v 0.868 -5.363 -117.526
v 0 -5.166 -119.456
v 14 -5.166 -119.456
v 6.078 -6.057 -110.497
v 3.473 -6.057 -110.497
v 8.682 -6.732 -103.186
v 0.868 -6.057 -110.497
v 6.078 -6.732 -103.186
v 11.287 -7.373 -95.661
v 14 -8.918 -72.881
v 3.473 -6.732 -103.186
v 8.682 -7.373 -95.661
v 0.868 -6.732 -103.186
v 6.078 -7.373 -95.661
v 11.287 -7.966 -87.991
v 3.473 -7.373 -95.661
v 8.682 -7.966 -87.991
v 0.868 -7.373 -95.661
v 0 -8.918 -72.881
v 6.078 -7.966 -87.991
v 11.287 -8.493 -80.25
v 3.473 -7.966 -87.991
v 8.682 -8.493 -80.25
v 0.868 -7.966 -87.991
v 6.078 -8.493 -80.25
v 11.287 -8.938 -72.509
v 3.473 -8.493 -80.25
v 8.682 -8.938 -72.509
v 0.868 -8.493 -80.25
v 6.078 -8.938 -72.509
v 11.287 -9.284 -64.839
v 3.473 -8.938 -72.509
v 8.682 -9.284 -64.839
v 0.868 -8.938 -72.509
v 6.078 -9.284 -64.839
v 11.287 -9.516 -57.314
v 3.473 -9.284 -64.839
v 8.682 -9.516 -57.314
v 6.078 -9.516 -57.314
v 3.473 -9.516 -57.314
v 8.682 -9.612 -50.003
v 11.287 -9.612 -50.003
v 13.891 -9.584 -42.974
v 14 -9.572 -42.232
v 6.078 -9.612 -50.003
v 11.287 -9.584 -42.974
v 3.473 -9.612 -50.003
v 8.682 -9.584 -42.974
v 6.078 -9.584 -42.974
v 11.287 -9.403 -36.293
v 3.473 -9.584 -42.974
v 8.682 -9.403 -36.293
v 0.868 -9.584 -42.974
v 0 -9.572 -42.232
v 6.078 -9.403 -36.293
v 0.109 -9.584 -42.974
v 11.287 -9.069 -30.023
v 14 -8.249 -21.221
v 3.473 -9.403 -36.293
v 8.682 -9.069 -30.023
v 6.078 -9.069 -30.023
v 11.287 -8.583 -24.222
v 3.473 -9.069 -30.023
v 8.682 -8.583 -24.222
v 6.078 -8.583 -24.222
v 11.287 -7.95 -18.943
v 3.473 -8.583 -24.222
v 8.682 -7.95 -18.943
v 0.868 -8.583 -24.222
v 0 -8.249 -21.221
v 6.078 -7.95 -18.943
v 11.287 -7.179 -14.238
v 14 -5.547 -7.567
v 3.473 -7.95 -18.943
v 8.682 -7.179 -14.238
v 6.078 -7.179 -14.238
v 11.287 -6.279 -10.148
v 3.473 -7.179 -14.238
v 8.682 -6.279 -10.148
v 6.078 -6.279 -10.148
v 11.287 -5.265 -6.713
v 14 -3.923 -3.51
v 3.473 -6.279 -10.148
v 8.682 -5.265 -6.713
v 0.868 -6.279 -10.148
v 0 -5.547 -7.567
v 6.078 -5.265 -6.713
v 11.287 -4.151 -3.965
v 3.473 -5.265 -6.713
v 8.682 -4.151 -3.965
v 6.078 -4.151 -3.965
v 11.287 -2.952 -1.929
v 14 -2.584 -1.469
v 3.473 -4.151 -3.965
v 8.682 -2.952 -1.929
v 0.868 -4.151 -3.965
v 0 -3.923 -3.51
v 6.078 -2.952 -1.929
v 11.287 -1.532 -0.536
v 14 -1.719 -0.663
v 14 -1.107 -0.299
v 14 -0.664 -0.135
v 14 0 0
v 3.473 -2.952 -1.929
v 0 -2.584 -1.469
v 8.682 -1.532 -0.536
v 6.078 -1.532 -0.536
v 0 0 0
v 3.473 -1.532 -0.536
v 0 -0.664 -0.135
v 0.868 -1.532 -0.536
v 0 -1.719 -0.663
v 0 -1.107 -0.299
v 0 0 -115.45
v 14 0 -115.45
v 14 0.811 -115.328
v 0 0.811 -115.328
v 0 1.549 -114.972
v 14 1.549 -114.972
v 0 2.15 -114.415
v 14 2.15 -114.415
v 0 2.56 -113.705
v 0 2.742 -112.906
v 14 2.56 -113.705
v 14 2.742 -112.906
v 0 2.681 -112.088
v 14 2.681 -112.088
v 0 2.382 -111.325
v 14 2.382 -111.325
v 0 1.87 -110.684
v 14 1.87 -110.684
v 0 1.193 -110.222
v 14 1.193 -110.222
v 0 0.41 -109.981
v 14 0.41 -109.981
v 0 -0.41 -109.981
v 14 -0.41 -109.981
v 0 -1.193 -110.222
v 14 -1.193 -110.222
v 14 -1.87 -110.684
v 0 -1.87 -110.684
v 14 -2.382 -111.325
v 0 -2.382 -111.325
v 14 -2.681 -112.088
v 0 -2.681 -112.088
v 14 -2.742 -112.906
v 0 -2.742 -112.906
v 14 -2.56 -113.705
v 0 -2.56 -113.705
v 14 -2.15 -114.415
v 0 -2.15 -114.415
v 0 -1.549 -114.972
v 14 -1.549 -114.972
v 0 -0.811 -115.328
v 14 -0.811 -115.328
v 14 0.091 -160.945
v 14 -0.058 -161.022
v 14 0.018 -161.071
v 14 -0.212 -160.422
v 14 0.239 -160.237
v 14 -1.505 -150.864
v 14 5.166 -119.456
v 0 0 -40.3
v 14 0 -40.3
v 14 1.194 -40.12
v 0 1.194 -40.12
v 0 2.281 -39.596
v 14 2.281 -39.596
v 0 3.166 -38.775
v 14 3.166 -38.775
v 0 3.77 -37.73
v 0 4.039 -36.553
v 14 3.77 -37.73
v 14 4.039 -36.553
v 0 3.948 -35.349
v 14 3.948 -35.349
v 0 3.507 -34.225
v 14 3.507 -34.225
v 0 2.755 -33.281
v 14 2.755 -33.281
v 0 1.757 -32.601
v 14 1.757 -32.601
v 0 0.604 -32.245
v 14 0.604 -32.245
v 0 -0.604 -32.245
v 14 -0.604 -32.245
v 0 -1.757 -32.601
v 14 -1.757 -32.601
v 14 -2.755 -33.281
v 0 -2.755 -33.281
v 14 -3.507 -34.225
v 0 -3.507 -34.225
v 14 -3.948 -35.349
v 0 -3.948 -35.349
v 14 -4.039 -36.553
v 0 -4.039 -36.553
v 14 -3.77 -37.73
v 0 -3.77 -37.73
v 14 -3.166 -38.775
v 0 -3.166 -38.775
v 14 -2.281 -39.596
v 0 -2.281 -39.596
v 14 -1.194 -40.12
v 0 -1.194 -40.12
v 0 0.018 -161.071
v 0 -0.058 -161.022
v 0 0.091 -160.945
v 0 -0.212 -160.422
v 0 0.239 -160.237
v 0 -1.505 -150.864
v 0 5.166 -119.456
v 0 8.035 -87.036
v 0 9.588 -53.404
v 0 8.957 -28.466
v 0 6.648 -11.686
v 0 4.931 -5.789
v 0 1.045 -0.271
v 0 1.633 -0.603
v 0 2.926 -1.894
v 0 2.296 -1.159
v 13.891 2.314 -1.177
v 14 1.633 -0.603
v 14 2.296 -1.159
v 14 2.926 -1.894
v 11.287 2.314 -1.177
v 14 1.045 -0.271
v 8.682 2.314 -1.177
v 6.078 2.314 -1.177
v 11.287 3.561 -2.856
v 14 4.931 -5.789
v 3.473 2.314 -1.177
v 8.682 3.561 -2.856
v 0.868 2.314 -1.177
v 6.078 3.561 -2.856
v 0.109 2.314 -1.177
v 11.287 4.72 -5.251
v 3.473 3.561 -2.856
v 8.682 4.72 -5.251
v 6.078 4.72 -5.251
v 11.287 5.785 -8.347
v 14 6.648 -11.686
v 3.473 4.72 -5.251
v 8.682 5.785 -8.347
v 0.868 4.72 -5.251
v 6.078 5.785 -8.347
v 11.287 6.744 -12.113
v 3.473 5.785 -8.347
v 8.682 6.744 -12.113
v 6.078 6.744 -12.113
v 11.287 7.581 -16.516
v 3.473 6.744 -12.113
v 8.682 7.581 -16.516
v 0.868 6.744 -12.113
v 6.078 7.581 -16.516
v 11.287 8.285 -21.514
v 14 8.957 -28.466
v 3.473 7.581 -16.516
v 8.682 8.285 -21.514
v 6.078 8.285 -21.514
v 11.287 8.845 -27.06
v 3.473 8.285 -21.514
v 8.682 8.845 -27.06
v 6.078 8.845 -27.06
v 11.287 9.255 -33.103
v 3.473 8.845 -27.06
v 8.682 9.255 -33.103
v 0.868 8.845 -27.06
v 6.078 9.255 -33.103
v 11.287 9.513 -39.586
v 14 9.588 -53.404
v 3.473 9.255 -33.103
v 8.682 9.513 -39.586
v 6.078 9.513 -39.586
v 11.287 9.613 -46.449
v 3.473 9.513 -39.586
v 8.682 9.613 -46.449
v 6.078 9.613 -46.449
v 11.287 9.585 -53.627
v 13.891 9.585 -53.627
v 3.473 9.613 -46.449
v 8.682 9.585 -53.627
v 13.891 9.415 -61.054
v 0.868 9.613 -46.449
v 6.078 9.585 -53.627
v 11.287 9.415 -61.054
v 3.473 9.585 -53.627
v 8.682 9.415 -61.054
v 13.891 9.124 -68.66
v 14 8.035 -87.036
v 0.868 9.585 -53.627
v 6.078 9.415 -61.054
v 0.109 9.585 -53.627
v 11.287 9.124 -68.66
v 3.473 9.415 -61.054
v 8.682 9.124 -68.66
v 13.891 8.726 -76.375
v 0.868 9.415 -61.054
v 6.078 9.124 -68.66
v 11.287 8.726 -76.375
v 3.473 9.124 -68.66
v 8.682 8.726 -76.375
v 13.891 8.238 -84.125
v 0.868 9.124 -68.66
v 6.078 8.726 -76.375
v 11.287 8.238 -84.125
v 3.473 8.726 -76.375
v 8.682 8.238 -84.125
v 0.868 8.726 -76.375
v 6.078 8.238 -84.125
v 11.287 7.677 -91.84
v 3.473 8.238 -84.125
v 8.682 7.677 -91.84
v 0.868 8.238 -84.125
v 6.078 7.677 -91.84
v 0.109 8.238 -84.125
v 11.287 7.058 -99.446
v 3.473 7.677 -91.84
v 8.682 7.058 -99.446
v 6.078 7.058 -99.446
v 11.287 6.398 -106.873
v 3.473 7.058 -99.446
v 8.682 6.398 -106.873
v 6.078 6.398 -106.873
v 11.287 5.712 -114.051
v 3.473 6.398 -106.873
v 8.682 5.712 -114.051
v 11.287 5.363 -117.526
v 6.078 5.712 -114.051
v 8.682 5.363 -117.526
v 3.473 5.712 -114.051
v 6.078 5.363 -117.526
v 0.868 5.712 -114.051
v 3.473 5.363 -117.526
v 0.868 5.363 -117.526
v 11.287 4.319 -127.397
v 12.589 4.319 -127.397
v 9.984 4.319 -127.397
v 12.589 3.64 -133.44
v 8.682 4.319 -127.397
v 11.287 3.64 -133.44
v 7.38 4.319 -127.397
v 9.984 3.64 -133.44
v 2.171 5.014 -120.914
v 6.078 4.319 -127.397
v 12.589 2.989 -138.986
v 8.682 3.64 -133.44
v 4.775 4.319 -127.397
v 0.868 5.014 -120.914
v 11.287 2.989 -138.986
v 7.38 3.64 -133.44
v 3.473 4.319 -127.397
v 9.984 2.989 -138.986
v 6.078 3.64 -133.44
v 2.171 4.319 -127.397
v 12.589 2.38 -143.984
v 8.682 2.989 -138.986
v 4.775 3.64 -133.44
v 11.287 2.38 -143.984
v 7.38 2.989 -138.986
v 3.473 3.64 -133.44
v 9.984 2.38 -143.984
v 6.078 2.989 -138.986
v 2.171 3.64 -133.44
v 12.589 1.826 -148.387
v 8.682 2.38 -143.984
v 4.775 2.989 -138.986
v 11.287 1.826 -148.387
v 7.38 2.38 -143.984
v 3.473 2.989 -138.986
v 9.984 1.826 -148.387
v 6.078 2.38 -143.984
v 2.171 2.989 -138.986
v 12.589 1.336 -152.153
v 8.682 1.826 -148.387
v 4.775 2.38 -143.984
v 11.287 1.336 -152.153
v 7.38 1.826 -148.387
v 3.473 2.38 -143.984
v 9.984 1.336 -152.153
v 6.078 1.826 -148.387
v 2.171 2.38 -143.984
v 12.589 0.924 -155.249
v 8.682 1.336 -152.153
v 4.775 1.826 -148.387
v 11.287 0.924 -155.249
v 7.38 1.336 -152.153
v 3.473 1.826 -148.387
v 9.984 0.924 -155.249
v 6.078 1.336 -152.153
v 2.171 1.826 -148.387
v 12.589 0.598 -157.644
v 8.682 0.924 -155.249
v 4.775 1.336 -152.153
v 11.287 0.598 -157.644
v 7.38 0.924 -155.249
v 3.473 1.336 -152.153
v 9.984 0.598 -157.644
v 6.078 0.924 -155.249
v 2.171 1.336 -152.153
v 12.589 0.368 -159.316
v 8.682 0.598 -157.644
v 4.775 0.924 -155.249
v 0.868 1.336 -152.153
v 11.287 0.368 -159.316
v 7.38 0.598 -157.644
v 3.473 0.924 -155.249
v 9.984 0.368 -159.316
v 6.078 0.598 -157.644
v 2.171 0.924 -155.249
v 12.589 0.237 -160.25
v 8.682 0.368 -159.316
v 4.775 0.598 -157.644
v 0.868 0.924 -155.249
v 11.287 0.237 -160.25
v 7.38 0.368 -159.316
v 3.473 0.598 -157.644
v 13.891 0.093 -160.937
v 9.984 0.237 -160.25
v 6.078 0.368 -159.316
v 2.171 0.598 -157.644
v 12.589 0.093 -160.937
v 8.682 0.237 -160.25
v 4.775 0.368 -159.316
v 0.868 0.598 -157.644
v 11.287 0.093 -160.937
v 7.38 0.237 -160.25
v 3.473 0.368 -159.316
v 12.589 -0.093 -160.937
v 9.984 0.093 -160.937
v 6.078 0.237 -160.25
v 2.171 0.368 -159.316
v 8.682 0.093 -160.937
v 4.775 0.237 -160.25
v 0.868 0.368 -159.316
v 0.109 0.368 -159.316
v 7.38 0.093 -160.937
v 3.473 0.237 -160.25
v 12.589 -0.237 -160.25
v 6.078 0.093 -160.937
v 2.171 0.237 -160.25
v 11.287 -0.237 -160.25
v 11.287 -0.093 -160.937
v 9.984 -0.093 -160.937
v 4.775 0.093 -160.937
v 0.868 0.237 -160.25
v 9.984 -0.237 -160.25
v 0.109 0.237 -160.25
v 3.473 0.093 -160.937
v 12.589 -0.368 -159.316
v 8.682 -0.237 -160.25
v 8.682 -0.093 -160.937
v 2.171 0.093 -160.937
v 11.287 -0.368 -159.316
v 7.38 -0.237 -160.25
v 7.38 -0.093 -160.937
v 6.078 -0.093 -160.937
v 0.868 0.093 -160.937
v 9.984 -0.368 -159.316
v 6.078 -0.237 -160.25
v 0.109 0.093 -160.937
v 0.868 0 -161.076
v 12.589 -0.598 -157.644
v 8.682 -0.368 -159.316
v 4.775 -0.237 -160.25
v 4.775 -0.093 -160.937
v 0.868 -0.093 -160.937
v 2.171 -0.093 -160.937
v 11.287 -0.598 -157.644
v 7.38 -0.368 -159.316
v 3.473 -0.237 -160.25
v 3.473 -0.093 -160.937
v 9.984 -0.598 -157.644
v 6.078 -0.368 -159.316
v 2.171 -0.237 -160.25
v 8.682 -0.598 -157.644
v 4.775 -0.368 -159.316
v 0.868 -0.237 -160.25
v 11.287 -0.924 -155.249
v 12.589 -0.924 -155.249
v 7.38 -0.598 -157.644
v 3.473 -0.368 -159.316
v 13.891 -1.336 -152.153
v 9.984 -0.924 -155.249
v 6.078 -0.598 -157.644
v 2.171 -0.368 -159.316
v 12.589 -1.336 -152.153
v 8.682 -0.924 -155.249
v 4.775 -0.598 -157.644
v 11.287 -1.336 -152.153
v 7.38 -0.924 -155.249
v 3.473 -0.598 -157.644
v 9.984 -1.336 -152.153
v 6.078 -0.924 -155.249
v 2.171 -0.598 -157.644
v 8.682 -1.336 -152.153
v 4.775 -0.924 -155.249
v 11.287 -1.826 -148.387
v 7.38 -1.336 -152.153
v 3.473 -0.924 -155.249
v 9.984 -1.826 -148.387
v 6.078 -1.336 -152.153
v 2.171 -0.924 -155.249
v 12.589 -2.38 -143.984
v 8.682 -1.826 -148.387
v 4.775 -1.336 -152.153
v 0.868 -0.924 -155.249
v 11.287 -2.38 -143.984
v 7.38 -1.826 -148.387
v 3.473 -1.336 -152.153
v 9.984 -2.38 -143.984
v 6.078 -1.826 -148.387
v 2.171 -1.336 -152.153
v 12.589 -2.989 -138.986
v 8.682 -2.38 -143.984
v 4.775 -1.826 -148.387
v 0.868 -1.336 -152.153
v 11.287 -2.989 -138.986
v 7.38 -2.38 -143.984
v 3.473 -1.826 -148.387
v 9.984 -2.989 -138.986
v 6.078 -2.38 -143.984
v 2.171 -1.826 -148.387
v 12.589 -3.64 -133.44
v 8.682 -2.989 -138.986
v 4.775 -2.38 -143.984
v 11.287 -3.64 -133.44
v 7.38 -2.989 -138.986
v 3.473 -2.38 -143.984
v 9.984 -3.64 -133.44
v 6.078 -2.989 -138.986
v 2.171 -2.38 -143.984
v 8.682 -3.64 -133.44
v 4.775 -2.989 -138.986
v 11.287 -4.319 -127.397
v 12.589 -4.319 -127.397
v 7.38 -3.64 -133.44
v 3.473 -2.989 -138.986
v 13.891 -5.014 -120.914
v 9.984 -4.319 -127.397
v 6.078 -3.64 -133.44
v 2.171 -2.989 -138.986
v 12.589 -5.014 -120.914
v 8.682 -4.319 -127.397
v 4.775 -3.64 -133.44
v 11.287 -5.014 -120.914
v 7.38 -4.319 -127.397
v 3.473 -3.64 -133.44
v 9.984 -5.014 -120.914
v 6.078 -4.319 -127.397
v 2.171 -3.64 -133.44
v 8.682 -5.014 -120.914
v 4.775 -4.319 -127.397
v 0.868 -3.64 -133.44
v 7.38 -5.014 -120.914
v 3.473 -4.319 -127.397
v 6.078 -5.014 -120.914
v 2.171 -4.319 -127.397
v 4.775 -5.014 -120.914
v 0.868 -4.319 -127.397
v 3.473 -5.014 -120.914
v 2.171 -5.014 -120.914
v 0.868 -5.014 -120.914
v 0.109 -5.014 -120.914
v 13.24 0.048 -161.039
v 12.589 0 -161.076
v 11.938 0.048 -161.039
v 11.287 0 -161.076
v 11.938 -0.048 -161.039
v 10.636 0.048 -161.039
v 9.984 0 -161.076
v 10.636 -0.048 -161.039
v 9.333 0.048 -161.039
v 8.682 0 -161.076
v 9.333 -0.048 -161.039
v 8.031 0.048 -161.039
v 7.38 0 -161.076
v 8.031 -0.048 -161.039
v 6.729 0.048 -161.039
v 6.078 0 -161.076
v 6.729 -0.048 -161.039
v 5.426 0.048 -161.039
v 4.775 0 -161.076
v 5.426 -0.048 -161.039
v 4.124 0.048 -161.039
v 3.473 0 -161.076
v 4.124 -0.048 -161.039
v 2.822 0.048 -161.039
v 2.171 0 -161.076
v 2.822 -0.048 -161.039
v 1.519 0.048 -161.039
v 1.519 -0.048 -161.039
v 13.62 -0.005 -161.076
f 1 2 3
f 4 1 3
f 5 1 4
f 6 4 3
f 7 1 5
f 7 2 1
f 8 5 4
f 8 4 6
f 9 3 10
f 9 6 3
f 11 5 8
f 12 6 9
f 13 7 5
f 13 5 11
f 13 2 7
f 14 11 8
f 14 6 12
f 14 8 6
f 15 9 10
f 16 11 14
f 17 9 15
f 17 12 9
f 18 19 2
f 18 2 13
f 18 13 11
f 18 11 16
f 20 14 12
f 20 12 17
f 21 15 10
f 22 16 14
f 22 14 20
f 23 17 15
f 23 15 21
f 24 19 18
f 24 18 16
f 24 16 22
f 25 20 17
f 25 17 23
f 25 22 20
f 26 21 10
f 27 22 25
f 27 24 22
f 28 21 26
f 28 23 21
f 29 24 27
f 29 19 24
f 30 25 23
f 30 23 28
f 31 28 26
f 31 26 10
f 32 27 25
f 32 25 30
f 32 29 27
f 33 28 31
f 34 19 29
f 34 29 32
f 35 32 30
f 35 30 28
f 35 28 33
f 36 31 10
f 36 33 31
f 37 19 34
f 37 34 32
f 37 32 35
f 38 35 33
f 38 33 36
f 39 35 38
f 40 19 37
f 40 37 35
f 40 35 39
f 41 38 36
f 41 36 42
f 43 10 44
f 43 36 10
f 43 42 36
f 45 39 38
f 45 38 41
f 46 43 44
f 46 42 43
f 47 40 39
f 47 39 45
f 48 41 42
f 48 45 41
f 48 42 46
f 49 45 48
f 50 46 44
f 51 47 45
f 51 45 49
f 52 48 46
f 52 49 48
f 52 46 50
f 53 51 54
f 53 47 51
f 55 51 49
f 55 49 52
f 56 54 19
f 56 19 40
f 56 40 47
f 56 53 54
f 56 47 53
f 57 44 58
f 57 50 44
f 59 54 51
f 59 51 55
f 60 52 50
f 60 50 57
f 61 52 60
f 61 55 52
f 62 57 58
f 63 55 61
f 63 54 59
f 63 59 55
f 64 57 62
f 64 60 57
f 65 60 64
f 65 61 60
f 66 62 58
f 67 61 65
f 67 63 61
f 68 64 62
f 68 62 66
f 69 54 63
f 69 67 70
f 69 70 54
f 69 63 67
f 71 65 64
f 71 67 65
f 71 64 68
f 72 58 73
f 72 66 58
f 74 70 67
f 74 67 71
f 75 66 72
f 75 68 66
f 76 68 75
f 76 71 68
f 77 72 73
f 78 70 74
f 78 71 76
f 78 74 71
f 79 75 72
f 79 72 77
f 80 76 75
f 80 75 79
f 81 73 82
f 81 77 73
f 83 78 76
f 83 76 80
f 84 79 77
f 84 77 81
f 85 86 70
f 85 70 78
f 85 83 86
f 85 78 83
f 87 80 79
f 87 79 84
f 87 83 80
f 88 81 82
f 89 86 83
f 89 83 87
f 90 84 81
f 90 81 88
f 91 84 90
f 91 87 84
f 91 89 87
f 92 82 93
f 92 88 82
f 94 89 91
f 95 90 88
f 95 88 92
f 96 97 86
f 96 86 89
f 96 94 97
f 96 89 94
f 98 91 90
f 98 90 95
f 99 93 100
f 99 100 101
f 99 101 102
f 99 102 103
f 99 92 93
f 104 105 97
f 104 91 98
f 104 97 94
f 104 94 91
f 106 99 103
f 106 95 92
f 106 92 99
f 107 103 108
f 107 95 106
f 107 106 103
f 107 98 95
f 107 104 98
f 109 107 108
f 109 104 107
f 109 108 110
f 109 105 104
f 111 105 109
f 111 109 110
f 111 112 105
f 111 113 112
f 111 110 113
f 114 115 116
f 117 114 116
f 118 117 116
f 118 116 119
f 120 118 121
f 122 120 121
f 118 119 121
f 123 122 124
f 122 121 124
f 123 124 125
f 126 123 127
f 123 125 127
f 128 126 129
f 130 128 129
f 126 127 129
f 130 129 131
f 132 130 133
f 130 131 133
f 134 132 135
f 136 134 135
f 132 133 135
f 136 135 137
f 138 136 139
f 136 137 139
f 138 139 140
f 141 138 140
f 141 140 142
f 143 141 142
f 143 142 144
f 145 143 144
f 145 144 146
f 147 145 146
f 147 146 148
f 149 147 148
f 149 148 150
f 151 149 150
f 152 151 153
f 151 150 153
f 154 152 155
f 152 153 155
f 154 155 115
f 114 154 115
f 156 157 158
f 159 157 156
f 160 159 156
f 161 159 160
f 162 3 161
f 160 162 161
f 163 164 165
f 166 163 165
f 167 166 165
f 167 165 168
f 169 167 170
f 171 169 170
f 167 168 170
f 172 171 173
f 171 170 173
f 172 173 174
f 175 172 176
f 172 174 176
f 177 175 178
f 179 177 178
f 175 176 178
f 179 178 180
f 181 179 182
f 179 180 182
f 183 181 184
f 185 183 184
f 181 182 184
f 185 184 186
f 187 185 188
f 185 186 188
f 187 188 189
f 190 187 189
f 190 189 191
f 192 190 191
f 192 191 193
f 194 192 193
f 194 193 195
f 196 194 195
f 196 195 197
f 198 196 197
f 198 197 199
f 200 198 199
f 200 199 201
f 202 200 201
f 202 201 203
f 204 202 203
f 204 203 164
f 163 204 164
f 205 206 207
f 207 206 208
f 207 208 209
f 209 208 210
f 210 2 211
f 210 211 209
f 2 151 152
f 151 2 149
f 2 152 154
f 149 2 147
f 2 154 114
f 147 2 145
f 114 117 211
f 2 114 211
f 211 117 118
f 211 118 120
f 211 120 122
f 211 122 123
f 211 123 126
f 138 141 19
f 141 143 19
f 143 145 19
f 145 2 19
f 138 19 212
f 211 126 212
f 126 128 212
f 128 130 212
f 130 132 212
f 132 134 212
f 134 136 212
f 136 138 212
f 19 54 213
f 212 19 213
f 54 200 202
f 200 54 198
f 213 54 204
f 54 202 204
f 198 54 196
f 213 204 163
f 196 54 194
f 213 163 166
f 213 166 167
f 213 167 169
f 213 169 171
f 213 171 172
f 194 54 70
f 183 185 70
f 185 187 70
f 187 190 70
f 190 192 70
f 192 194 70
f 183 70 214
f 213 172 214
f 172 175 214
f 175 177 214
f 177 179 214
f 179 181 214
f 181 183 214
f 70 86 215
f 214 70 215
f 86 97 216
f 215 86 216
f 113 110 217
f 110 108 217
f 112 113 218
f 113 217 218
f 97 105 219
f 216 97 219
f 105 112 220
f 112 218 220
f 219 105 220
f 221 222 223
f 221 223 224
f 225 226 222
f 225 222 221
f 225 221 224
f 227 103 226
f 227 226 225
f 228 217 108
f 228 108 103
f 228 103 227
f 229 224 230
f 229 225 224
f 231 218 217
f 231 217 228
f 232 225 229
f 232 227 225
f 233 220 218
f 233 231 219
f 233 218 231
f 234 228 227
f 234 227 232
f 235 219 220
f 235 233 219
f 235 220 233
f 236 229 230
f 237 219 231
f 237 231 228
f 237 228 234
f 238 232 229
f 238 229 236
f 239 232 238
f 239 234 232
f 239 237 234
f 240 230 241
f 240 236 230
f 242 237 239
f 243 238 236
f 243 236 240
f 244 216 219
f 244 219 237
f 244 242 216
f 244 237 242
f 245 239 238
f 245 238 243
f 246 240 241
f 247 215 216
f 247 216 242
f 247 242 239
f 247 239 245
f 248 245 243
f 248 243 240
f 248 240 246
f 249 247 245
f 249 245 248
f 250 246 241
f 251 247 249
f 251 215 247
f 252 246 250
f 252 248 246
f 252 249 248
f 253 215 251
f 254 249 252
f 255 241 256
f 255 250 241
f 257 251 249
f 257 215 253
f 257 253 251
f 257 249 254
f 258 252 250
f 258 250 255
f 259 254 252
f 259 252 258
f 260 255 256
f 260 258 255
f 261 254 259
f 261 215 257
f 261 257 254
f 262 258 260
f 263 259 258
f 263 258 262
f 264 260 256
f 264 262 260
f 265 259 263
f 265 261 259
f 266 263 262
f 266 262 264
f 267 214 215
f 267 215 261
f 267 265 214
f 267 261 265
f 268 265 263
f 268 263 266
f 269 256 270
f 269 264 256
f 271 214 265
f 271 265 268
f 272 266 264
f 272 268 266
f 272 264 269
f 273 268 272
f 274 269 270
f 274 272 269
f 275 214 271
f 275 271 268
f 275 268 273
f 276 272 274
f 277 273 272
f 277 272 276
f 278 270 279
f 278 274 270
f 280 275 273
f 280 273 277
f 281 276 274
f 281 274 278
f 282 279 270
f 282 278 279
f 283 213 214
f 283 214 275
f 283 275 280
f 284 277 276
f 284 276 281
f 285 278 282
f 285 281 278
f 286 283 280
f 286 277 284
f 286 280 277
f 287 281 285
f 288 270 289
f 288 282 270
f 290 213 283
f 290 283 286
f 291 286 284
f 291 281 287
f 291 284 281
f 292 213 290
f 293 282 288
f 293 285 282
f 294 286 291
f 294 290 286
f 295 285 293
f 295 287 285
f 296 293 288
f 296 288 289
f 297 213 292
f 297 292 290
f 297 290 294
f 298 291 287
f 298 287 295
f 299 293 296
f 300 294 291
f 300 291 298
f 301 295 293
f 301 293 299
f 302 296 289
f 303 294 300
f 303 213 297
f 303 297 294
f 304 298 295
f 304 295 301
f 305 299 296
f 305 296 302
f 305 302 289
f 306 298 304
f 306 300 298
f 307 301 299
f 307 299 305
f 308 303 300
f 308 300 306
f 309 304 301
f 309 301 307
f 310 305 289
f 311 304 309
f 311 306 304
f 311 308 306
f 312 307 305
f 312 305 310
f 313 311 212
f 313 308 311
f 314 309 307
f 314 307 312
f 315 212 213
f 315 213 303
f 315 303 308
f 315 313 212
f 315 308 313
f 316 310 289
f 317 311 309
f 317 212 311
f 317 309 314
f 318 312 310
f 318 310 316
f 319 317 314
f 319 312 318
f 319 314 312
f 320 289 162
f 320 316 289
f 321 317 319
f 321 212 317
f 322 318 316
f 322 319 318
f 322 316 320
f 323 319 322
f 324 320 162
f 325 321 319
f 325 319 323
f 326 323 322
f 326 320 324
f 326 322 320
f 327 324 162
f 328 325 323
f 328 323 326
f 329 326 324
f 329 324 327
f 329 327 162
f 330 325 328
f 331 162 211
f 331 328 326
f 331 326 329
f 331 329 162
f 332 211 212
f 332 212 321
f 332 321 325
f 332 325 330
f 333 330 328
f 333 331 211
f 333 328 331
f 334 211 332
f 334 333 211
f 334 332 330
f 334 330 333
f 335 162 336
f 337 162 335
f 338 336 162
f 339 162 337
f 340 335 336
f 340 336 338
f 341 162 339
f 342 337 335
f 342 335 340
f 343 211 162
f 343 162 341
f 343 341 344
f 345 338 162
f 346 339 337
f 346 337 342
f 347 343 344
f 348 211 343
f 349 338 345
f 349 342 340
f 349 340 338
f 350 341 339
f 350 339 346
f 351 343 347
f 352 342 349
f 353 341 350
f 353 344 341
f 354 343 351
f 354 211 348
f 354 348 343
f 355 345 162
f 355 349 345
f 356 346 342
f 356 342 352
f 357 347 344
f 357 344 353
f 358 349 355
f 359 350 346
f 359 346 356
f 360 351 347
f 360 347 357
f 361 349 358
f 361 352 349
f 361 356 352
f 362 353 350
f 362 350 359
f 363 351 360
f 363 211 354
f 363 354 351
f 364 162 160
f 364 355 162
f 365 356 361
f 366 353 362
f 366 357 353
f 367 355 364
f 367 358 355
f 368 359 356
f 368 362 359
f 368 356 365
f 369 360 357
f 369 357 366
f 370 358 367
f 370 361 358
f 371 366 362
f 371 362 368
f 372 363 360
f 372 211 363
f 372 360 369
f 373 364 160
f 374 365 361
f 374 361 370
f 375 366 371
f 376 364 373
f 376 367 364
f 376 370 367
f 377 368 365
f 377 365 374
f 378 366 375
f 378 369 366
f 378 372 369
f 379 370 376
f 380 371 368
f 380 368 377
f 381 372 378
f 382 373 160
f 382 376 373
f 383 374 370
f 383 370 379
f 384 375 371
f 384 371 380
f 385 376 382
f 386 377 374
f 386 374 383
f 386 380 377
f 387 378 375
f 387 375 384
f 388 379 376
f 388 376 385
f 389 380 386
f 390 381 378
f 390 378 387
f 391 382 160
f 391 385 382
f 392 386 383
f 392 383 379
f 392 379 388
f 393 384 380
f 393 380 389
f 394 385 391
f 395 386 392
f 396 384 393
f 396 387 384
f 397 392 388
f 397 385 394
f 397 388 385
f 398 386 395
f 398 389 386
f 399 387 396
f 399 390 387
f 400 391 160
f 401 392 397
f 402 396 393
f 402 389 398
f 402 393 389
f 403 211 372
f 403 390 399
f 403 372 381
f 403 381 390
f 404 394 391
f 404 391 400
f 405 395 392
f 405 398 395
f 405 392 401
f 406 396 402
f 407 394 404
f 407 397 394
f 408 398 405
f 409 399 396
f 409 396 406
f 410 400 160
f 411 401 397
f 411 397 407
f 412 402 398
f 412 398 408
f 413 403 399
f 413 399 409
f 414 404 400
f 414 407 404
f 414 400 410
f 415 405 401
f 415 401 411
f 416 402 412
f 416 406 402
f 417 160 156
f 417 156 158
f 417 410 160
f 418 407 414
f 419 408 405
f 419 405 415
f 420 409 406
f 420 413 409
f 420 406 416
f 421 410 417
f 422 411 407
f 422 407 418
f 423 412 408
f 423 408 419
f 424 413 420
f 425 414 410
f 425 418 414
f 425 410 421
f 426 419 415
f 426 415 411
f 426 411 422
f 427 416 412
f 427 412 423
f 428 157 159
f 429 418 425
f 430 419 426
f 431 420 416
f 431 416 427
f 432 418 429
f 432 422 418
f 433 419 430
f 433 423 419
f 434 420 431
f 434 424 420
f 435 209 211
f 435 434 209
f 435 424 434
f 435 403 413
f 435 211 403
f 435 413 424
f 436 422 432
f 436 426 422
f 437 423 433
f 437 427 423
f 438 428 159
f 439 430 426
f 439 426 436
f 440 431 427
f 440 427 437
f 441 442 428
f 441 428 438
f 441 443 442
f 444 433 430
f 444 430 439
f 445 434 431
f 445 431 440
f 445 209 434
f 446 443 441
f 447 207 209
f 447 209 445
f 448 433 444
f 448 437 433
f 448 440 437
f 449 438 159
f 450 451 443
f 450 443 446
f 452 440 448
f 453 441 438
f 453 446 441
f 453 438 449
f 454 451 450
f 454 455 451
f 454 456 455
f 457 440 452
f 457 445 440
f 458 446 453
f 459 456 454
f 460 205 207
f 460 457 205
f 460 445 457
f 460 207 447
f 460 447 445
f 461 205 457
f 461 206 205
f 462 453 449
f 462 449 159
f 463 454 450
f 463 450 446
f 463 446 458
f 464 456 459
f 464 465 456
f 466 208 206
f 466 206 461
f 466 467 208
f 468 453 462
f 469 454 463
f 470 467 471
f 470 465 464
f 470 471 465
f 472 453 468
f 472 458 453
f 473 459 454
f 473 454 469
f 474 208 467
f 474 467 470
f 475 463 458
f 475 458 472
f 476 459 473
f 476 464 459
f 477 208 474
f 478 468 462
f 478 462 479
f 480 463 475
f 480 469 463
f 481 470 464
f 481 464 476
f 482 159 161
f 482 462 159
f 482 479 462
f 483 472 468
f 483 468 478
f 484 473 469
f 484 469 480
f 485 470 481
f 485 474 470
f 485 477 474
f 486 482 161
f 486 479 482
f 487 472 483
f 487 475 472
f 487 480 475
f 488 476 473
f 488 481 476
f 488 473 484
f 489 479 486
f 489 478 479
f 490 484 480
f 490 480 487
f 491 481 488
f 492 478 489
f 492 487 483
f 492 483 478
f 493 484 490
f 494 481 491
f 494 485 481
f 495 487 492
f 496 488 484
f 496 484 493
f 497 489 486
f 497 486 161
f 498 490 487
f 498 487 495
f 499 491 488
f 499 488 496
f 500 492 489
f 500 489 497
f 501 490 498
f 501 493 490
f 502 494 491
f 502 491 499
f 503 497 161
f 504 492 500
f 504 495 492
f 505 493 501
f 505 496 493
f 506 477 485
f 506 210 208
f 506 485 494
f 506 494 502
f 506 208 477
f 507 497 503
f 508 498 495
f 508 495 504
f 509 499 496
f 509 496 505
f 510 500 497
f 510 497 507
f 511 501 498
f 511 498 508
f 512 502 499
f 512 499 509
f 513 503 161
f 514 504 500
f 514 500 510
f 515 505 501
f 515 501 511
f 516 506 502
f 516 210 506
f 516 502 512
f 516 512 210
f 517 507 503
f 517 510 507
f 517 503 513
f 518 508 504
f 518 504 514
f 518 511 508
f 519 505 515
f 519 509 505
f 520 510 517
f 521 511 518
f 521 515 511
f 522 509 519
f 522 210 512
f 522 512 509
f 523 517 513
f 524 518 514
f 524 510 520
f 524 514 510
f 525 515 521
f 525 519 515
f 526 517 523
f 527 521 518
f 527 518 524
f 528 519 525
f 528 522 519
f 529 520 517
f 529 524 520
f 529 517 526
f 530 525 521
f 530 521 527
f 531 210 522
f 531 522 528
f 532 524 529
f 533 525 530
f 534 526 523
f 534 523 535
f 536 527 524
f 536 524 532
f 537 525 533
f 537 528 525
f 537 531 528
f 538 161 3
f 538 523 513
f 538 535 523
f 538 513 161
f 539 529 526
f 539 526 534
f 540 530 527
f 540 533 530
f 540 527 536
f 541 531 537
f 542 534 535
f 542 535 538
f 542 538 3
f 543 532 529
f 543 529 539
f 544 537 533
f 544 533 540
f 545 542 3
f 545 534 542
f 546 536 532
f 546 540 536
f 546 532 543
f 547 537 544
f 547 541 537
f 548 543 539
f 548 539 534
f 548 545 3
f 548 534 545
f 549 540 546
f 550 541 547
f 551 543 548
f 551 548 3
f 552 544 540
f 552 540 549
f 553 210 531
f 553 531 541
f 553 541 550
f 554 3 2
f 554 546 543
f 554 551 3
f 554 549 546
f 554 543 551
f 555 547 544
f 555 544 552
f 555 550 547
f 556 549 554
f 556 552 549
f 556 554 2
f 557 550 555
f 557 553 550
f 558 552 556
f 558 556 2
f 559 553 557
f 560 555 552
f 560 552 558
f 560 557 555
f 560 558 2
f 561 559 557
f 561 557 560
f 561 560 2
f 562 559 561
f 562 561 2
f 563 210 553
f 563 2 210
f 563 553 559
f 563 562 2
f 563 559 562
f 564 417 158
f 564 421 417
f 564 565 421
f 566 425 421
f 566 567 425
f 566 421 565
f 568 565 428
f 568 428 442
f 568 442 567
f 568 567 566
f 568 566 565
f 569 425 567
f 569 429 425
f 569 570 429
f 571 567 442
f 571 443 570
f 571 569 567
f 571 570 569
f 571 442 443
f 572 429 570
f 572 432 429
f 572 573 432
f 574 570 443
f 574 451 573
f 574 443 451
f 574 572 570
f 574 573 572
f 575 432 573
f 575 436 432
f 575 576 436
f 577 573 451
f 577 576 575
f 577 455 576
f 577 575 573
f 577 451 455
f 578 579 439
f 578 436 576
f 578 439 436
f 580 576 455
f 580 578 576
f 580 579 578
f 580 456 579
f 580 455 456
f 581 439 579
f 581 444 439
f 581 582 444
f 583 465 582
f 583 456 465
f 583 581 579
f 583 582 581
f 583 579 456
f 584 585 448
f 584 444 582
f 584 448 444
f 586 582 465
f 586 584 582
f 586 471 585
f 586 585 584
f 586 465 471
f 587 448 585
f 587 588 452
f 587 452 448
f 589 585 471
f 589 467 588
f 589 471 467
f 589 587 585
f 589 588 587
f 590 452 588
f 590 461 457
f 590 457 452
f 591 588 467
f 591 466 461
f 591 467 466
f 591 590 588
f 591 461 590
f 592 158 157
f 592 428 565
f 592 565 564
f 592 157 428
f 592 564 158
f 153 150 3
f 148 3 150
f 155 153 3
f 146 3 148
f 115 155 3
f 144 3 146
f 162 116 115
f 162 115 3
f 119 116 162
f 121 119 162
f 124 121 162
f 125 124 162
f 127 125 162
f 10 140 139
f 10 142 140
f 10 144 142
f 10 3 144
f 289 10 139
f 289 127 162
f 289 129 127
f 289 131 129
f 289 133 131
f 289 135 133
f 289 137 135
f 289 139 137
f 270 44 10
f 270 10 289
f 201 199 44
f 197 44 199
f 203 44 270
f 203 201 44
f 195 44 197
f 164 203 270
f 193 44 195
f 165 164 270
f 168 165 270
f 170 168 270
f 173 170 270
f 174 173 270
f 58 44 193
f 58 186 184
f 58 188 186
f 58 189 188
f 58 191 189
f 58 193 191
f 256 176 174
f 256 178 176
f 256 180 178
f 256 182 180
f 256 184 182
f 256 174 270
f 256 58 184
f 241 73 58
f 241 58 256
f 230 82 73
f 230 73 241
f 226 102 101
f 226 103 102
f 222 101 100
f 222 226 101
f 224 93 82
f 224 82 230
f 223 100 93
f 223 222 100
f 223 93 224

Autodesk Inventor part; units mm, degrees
ref_plane "YZ Plane" through (0, 0, 0) normal (1, 0, 0) x (0, 1, 0)
ref_plane "XZ Plane" through (0, 0, 0) normal (0, 1, 0) x (-1, 0, 0)
ref_plane "XY Plane" through (0, 0, 0) normal (0, 0, 1) x (1, 0, 0)
sketch "Sketch9" plane through (0, 0, 0) normal (1, 0, 0) x (0, 1, 0)
  line L0 (0, 0) -> (0.6838, -0.0937) construction
  line L1 (0.6838, -0.0937) -> (1.3528, -0.3746) construction
  line L2 (1.3528, -0.3746) -> (2.0064, -0.8421) construction
  line L3 (2.0064, -0.8421) -> (2.6435, -1.495) construction
  line L4 (2.6435, -1.495) -> (3.263, -2.3319) construction
  line L5 (3.263, -2.3319) -> (3.8633, -3.3508) construction
  line L6 (3.8633, -3.3508) -> (4.4431, -4.5492) construction
  line L7 (4.4431, -4.5492) -> (5.0005, -5.9245) construction
  line L8 (5.0005, -5.9245) -> (5.5339, -7.4733) construction
  line L9 (5.5339, -7.4733) -> (6.0414, -9.1922) construction
  line L10 (6.0414, -9.1922) -> (6.5213, -11.0769) construction
  line L11 (6.5213, -11.0769) -> (6.9717, -13.1233) construction
  line L12 (6.9717, -13.1233) -> (7.3908, -15.3264) construction
  line L13 (7.3908, -15.3264) -> (7.7773, -17.6811) construction
  line L14 (7.7773, -17.6811) -> (8.1295, -20.182) construction
  line L15 (8.1295, -20.182) -> (8.4463, -22.8232) construction
  line L16 (8.4463, -22.8232) -> (8.7266, -25.5985) construction
  line L17 (8.7266, -25.5985) -> (8.9696, -28.5014) construction
  line L18 (8.9696, -28.5014) -> (9.1748, -31.5252) construction
  line L19 (9.1748, -31.5252) -> (9.3419, -34.6628) construction
  line L20 (9.3419, -34.6628) -> (9.4708, -37.9069) construction
  line L21 (9.4708, -37.9069) -> (9.5619, -41.2498) construction
  line L22 (9.5619, -41.2498) -> (9.6156, -44.6839) construction
  line L23 (9.6156, -44.6839) -> (9.6156, -48.201) construction
  line L24 (9.6156, -48.201) -> (9.6156, -51.793) construction
  line L25 (9.6156, -51.793) -> (9.5617, -55.4514) construction
  line L26 (9.5617, -55.4514) -> (9.4762, -59.1677) construction
  line L27 (9.4762, -59.1677) -> (9.3595, -62.9333) construction
  line L28 (9.3595, -62.9333) -> (9.2132, -66.7394) construction
  line L29 (9.2132, -66.7394) -> (9.0394, -70.5769) construction
  line L30 (9.0394, -70.5769) -> (8.8398, -74.4371) construction
  line L31 (8.8398, -74.4371) -> (8.6167, -78.3109) construction
  line L32 (8.6167, -78.3109) -> (8.372, -82.1891) construction
  line L33 (8.372, -82.1891) -> (8.1078, -86.0629) construction
  line L34 (8.1078, -86.0629) -> (7.8263, -89.9231) construction
  line L35 (7.8263, -89.9231) -> (7.5294, -93.7607) construction
  line L36 (7.5294, -93.7607) -> (7.2193, -97.5667) construction
  line L37 (7.2193, -97.5667) -> (6.8979, -101.3323) construction
  line L38 (6.8979, -101.3323) -> (6.5672, -105.0486) construction
  line L39 (6.5672, -105.0486) -> (6.2291, -108.7071) construction
  line L40 (6.2291, -108.7071) -> (5.8855, -112.299) construction
  line L41 (5.8855, -112.299) -> (5.5382, -115.8161) construction
  line L42 (5.5382, -115.8161) -> (5.1889, -119.2502) construction
  line L43 (5.1889, -119.2502) -> (4.8393, -122.5931) construction
  line L44 (4.8393, -122.5931) -> (4.4912, -125.8372) construction
  line L45 (4.4912, -125.8372) -> (4.1463, -128.9748) construction
  line L46 (4.1463, -128.9748) -> (3.8061, -131.9986) construction
  line L47 (3.8061, -131.9986) -> (3.4724, -134.9015) construction
  line L48 (3.4724, -134.9015) -> (3.1466, -137.6768) construction
  line L49 (3.1466, -137.6768) -> (2.8305, -140.318) construction
  line L50 (2.8305, -140.318) -> (2.5255, -142.8189) construction
  line L51 (2.5255, -142.8189) -> (2.2332, -145.1736) construction
  line L52 (2.2332, -145.1736) -> (1.9553, -147.3767) construction
  line L53 (1.9553, -147.3767) -> (1.693, -149.4231) construction
  line L54 (1.693, -149.4231) -> (1.448, -151.3078) construction
  line L55 (1.448, -151.3078) -> (1.2215, -153.0267) construction
  line L56 (1.2215, -153.0267) -> (1.015, -154.5755) construction
  line L57 (1.015, -154.5755) -> (0.8295, -155.9508) construction
  line L58 (0.8295, -155.9508) -> (0.6664, -157.1492) construction
  line L59 (0.6664, -157.1492) -> (0.5265, -158.1681) construction
  line L60 (0.5265, -158.1681) -> (0.4108, -159.0049) construction
  line L61 (0.4108, -159.0049) -> (0.32, -159.6579) construction
  line L62 (0.32, -159.6579) -> (0.2547, -160.1254) construction
  line L63 (0.2547, -160.1254) -> (0.2154, -160.4063) construction
  line L64 (0.2154, -160.4063) -> (0.2022, -160.5) construction
  line L65 (0.2022, -160.5) -> (0, -161.463) construction
  line L66 (0, -161.463) -> (-0.2022, -160.5) construction
  line L67 (-0.2022, -160.5) -> (-0.2154, -160.4063) construction
  line L68 (-0.2154, -160.4063) -> (-0.2547, -160.1254) construction
  line L69 (-0.2547, -160.1254) -> (-0.32, -159.6579) construction
  line L70 (-0.32, -159.6579) -> (-0.4108, -159.0049) construction
  line L71 (-0.4108, -159.0049) -> (-0.5265, -158.1681) construction
  line L72 (-0.5265, -158.1681) -> (-0.6664, -157.1492) construction
  line L73 (-0.6664, -157.1492) -> (-0.8295, -155.9508) construction
  line L74 (-0.8295, -155.9508) -> (-1.015, -154.5755) construction
  line L75 (-1.015, -154.5755) -> (-1.2215, -153.0267) construction
  line L76 (-1.2215, -153.0267) -> (-1.448, -151.3078) construction
  line L77 (-1.448, -151.3078) -> (-1.693, -149.4231) construction
  line L78 (-1.693, -149.4231) -> (-1.9553, -147.3767) construction
  line L79 (-1.9553, -147.3767) -> (-2.2332, -145.1736) construction
  line L80 (-2.2332, -145.1736) -> (-2.5255, -142.8189) construction
  line L81 (-2.5255, -142.8189) -> (-2.8305, -140.318) construction
  line L82 (-2.8305, -140.318) -> (-3.1466, -137.6768) construction
  line L83 (-3.1466, -137.6768) -> (-3.4724, -134.9015) construction
  line L84 (-3.4724, -134.9015) -> (-3.8061, -131.9986) construction
  line L85 (-3.8061, -131.9986) -> (-4.1463, -128.9748) construction
  line L86 (-4.1463, -128.9748) -> (-4.4912, -125.8372) construction
  line L87 (-4.4912, -125.8372) -> (-4.8393, -122.5931) construction
  line L88 (-4.8393, -122.5931) -> (-5.1889, -119.2502) construction
  line L89 (-5.1889, -119.2502) -> (-5.5382, -115.8161) construction
  line L90 (-5.5382, -115.8161) -> (-5.8855, -112.299) construction
  line L91 (-5.8855, -112.299) -> (-6.2291, -108.7071) construction
  line L92 (-6.2291, -108.7071) -> (-6.5672, -105.0486) construction
  line L93 (-6.5672, -105.0486) -> (-6.8979, -101.3323) construction
  line L94 (-6.8979, -101.3323) -> (-7.2193, -97.5667) construction
  line L95 (-7.2193, -97.5667) -> (-7.5294, -93.7607) construction
  line L96 (-7.5294, -93.7607) -> (-7.8263, -89.9231) construction
  line L97 (-7.8263, -89.9231) -> (-8.1078, -86.0629) construction
  line L98 (-8.1078, -86.0629) -> (-8.372, -82.1891) construction
  line L99 (-8.372, -82.1891) -> (-8.6167, -78.3109) construction
  line L100 (-8.6167, -78.3109) -> (-8.8398, -74.4371) construction
  line L101 (-8.8398, -74.4371) -> (-9.0394, -70.5769) construction
  line L102 (-9.0394, -70.5769) -> (-9.2132, -66.7394) construction
  line L103 (-9.2132, -66.7394) -> (-9.3595, -62.9333) construction
  line L104 (-9.3595, -62.9333) -> (-9.4762, -59.1677) construction
  line L105 (-9.4762, -59.1677) -> (-9.5617, -55.4514) construction
  line L106 (-9.5617, -55.4514) -> (-9.6144, -51.793) construction
  line L107 (-9.6144, -51.793) -> (-9.6144, -48.201) construction
  line L108 (-9.6144, -48.201) -> (-9.6144, -44.6839) construction
  line L109 (-9.6144, -44.6839) -> (-9.5619, -41.2498) construction
  line L110 (-9.5619, -41.2498) -> (-9.4708, -37.9069) construction
  line L111 (-9.4708, -37.9069) -> (-9.3419, -34.6628) construction
  line L112 (-9.3419, -34.6628) -> (-9.1748, -31.5252) construction
  line L113 (-9.1748, -31.5252) -> (-8.9696, -28.5014) construction
  line L114 (-8.9696, -28.5014) -> (-8.7266, -25.5985) construction
  line L115 (-8.7266, -25.5985) -> (-8.4463, -22.8232) construction
  line L116 (-8.4463, -22.8232) -> (-8.1295, -20.182) construction
  line L117 (-8.1295, -20.182) -> (-7.7773, -17.6811) construction
  line L118 (-7.7773, -17.6811) -> (-7.3908, -15.3264) construction
  line L119 (-7.3908, -15.3264) -> (-6.9717, -13.1233) construction
  line L120 (-6.9717, -13.1233) -> (-6.5213, -11.0769) construction
  line L121 (-6.5213, -11.0769) -> (-6.0414, -9.1922) construction
  line L122 (-6.0414, -9.1922) -> (-5.5339, -7.4733) construction
  line L123 (-5.5339, -7.4733) -> (-5.0005, -5.9245) construction
  line L124 (-5.0005, -5.9245) -> (-4.4431, -4.5492) construction
  line L125 (-4.4431, -4.5492) -> (-3.8633, -3.3508) construction
  line L126 (-3.8633, -3.3508) -> (-3.263, -2.3319) construction
  line L127 (-3.263, -2.3319) -> (-2.6435, -1.495) construction
  line L128 (-2.6435, -1.495) -> (-2.0064, -0.8421) construction
  line L129 (-2.0064, -0.8421) -> (-1.3528, -0.3746) construction
  line L130 (-1.3528, -0.3746) -> (-0.6838, -0.0937) construction
  line L131 (-0.6838, -0.0937) -> (0, 0) construction
  spline S0 degree 4 poles (0, 0) (0.6838, -0.0937) (1.3528, -0.3746) (2.0064, -0.8421) (2.6435, -1.495) (3.263, -2.3319) (3.8633, -3.3508) (4.4431, -4.5492) (5.0005, -5.9245) (5.5339, -7.4733) (6.0414, -9.1922) (6.5213, -11.0769) (6.9717, -13.1233) (7.3908, -15.3264) (7.7773, -17.6811) (8.1295, -20.182) (8.4463, -22.8232) (8.7266, -25.5985) (8.9696, -28.5014) (9.1748, -31.5252) (9.3419, -34.6628) (9.4708, -37.9069) (9.5619, -41.2498) (9.6156, -44.6839) (9.6156, -48.201) (9.6156, -51.793) (9.5617, -55.4514) (9.4762, -59.1677) (9.3595, -62.9333) (9.2132, -66.7394) (9.0394, -70.5769) (8.8398, -74.4371) (8.6167, -78.3109) (8.372, -82.1891) (8.1078, -86.0629) (7.8263, -89.9231) (7.5294, -93.7607) (7.2193, -97.5667) (6.8979, -101.3323) (6.5672, -105.0486) (6.2291, -108.7071) (5.8855, -112.299) (5.5382, -115.8161) (5.1889, -119.2502) (4.8393, -122.5931) (4.4912, -125.8372) (4.1463, -128.9748) (3.8061, -131.9986) (3.4724, -134.9015) (3.1466, -137.6768) (2.8305, -140.318) (2.5255, -142.8189) (2.2332, -145.1736) (1.9553, -147.3767) (1.693, -149.4231) (1.448, -151.3078) (1.2215, -153.0267) (1.015, -154.5755) (0.8295, -155.9508) (0.6664, -157.1492) (0.5265, -158.1681) (0.4108, -159.0049) (0.32, -159.6579) (0.2547, -160.1254) (0.2154, -160.4063) (0.2022, -160.5) (0, -161.463) (-0.2022, -160.5) (-0.2154, -160.4063) (-0.2547, -160.1254) (-0.32, -159.6579) (-0.4108, -159.0049) (-0.5265, -158.1681) (-0.6664, -157.1492) (-0.8295, -155.9508) (-1.015, -154.5755) (-1.2215, -153.0267) (-1.448, -151.3078) (-1.693, -149.4231) (-1.9553, -147.3767) (-2.2332, -145.1736) (-2.5255, -142.8189) (-2.8305, -140.318) (-3.1466, -137.6768) (-3.4724, -134.9015) (-3.8061, -131.9986) (-4.1463, -128.9748) (-4.4912, -125.8372) (-4.8393, -122.5931) (-5.1889, -119.2502) (-5.5382, -115.8161) (-5.8855, -112.299) (-6.2291, -108.7071) (-6.5672, -105.0486) (-6.8979, -101.3323) (-7.2193, -97.5667) (-7.5294, -93.7607) (-7.8263, -89.9231) (-8.1078, -86.0629) (-8.372, -82.1891) (-8.6167, -78.3109) (-8.8398, -74.4371) (-9.0394, -70.5769) (-9.2132, -66.7394) (-9.3595, -62.9333) (-9.4762, -59.1677) (-9.5617, -55.4514) (-9.6144, -51.793) (-9.6144, -48.201) (-9.6144, -44.6839) (-9.5619, -41.2498) (-9.4708, -37.9069) (-9.3419, -34.6628) (-9.1748, -31.5252) (-8.9696, -28.5014) (-8.7266, -25.5985) (-8.4463, -22.8232) (-8.1295, -20.182) (-7.7773, -17.6811) (-7.3908, -15.3264) (-6.9717, -13.1233) (-6.5213, -11.0769) (-6.0414, -9.1922) (-5.5339, -7.4733) (-5.0005, -5.9245) (-4.4431, -4.5492) (-3.8633, -3.3508) (-3.263, -2.3319) (-2.6435, -1.495) (-2.0064, -0.8421) (-1.3528, -0.3746) (-0.6838, -0.0937) (0, 0) knots 1 1 1 1 1 2 3 4 5 6 7 8 9 10 11 12 13 14 15 16 17 18 19 20 21 22 23 24 25 26 27 28 29 30 31 32 33 34 35 36 37 38 39 40 41 42 43 44 45 46 47 48 49 50 51 52 53 54 55 56 57 58 59 60 61 62 63 64 65 66 67 68 69 70 71 72 73 74 75 76 77 78 79 80 81 82 83 84 85 86 87 88 89 90 91 92 93 94 95 96 97 98 99 100 101 102 103 104 105 106 107 108 109 110 111 112 113 114 115 116 117 118 119 120 121 122 123 124 125 126 127 128 129 130 130 130 130 130
  line L132 (20.0771, -119.4555) -> (-24.676, -119.4555)
  dimension "d95" = 119.4555
extrude "Extrusion3" add sketch "Sketch9" along normal blind 14
sketch "Sketch10" plane through (14, 0, 0) normal (1, 0, 0) x (0, 0, -1)
  circle A0 centre (112.7, 0) radius 2.75
  circle A1 centre (36.25, 0) radius 4.05
  point P0 (0, 0)
  dimension "d87" = 5.5
  dimension "d88" = 8.1
  dimension "d89" = 36.25
  dimension "d90" = 112.7
extrude "Extrusion4" cut sketch "Sketch10" against normal blind 15
properties part number "6P-004" material "Poplar"
